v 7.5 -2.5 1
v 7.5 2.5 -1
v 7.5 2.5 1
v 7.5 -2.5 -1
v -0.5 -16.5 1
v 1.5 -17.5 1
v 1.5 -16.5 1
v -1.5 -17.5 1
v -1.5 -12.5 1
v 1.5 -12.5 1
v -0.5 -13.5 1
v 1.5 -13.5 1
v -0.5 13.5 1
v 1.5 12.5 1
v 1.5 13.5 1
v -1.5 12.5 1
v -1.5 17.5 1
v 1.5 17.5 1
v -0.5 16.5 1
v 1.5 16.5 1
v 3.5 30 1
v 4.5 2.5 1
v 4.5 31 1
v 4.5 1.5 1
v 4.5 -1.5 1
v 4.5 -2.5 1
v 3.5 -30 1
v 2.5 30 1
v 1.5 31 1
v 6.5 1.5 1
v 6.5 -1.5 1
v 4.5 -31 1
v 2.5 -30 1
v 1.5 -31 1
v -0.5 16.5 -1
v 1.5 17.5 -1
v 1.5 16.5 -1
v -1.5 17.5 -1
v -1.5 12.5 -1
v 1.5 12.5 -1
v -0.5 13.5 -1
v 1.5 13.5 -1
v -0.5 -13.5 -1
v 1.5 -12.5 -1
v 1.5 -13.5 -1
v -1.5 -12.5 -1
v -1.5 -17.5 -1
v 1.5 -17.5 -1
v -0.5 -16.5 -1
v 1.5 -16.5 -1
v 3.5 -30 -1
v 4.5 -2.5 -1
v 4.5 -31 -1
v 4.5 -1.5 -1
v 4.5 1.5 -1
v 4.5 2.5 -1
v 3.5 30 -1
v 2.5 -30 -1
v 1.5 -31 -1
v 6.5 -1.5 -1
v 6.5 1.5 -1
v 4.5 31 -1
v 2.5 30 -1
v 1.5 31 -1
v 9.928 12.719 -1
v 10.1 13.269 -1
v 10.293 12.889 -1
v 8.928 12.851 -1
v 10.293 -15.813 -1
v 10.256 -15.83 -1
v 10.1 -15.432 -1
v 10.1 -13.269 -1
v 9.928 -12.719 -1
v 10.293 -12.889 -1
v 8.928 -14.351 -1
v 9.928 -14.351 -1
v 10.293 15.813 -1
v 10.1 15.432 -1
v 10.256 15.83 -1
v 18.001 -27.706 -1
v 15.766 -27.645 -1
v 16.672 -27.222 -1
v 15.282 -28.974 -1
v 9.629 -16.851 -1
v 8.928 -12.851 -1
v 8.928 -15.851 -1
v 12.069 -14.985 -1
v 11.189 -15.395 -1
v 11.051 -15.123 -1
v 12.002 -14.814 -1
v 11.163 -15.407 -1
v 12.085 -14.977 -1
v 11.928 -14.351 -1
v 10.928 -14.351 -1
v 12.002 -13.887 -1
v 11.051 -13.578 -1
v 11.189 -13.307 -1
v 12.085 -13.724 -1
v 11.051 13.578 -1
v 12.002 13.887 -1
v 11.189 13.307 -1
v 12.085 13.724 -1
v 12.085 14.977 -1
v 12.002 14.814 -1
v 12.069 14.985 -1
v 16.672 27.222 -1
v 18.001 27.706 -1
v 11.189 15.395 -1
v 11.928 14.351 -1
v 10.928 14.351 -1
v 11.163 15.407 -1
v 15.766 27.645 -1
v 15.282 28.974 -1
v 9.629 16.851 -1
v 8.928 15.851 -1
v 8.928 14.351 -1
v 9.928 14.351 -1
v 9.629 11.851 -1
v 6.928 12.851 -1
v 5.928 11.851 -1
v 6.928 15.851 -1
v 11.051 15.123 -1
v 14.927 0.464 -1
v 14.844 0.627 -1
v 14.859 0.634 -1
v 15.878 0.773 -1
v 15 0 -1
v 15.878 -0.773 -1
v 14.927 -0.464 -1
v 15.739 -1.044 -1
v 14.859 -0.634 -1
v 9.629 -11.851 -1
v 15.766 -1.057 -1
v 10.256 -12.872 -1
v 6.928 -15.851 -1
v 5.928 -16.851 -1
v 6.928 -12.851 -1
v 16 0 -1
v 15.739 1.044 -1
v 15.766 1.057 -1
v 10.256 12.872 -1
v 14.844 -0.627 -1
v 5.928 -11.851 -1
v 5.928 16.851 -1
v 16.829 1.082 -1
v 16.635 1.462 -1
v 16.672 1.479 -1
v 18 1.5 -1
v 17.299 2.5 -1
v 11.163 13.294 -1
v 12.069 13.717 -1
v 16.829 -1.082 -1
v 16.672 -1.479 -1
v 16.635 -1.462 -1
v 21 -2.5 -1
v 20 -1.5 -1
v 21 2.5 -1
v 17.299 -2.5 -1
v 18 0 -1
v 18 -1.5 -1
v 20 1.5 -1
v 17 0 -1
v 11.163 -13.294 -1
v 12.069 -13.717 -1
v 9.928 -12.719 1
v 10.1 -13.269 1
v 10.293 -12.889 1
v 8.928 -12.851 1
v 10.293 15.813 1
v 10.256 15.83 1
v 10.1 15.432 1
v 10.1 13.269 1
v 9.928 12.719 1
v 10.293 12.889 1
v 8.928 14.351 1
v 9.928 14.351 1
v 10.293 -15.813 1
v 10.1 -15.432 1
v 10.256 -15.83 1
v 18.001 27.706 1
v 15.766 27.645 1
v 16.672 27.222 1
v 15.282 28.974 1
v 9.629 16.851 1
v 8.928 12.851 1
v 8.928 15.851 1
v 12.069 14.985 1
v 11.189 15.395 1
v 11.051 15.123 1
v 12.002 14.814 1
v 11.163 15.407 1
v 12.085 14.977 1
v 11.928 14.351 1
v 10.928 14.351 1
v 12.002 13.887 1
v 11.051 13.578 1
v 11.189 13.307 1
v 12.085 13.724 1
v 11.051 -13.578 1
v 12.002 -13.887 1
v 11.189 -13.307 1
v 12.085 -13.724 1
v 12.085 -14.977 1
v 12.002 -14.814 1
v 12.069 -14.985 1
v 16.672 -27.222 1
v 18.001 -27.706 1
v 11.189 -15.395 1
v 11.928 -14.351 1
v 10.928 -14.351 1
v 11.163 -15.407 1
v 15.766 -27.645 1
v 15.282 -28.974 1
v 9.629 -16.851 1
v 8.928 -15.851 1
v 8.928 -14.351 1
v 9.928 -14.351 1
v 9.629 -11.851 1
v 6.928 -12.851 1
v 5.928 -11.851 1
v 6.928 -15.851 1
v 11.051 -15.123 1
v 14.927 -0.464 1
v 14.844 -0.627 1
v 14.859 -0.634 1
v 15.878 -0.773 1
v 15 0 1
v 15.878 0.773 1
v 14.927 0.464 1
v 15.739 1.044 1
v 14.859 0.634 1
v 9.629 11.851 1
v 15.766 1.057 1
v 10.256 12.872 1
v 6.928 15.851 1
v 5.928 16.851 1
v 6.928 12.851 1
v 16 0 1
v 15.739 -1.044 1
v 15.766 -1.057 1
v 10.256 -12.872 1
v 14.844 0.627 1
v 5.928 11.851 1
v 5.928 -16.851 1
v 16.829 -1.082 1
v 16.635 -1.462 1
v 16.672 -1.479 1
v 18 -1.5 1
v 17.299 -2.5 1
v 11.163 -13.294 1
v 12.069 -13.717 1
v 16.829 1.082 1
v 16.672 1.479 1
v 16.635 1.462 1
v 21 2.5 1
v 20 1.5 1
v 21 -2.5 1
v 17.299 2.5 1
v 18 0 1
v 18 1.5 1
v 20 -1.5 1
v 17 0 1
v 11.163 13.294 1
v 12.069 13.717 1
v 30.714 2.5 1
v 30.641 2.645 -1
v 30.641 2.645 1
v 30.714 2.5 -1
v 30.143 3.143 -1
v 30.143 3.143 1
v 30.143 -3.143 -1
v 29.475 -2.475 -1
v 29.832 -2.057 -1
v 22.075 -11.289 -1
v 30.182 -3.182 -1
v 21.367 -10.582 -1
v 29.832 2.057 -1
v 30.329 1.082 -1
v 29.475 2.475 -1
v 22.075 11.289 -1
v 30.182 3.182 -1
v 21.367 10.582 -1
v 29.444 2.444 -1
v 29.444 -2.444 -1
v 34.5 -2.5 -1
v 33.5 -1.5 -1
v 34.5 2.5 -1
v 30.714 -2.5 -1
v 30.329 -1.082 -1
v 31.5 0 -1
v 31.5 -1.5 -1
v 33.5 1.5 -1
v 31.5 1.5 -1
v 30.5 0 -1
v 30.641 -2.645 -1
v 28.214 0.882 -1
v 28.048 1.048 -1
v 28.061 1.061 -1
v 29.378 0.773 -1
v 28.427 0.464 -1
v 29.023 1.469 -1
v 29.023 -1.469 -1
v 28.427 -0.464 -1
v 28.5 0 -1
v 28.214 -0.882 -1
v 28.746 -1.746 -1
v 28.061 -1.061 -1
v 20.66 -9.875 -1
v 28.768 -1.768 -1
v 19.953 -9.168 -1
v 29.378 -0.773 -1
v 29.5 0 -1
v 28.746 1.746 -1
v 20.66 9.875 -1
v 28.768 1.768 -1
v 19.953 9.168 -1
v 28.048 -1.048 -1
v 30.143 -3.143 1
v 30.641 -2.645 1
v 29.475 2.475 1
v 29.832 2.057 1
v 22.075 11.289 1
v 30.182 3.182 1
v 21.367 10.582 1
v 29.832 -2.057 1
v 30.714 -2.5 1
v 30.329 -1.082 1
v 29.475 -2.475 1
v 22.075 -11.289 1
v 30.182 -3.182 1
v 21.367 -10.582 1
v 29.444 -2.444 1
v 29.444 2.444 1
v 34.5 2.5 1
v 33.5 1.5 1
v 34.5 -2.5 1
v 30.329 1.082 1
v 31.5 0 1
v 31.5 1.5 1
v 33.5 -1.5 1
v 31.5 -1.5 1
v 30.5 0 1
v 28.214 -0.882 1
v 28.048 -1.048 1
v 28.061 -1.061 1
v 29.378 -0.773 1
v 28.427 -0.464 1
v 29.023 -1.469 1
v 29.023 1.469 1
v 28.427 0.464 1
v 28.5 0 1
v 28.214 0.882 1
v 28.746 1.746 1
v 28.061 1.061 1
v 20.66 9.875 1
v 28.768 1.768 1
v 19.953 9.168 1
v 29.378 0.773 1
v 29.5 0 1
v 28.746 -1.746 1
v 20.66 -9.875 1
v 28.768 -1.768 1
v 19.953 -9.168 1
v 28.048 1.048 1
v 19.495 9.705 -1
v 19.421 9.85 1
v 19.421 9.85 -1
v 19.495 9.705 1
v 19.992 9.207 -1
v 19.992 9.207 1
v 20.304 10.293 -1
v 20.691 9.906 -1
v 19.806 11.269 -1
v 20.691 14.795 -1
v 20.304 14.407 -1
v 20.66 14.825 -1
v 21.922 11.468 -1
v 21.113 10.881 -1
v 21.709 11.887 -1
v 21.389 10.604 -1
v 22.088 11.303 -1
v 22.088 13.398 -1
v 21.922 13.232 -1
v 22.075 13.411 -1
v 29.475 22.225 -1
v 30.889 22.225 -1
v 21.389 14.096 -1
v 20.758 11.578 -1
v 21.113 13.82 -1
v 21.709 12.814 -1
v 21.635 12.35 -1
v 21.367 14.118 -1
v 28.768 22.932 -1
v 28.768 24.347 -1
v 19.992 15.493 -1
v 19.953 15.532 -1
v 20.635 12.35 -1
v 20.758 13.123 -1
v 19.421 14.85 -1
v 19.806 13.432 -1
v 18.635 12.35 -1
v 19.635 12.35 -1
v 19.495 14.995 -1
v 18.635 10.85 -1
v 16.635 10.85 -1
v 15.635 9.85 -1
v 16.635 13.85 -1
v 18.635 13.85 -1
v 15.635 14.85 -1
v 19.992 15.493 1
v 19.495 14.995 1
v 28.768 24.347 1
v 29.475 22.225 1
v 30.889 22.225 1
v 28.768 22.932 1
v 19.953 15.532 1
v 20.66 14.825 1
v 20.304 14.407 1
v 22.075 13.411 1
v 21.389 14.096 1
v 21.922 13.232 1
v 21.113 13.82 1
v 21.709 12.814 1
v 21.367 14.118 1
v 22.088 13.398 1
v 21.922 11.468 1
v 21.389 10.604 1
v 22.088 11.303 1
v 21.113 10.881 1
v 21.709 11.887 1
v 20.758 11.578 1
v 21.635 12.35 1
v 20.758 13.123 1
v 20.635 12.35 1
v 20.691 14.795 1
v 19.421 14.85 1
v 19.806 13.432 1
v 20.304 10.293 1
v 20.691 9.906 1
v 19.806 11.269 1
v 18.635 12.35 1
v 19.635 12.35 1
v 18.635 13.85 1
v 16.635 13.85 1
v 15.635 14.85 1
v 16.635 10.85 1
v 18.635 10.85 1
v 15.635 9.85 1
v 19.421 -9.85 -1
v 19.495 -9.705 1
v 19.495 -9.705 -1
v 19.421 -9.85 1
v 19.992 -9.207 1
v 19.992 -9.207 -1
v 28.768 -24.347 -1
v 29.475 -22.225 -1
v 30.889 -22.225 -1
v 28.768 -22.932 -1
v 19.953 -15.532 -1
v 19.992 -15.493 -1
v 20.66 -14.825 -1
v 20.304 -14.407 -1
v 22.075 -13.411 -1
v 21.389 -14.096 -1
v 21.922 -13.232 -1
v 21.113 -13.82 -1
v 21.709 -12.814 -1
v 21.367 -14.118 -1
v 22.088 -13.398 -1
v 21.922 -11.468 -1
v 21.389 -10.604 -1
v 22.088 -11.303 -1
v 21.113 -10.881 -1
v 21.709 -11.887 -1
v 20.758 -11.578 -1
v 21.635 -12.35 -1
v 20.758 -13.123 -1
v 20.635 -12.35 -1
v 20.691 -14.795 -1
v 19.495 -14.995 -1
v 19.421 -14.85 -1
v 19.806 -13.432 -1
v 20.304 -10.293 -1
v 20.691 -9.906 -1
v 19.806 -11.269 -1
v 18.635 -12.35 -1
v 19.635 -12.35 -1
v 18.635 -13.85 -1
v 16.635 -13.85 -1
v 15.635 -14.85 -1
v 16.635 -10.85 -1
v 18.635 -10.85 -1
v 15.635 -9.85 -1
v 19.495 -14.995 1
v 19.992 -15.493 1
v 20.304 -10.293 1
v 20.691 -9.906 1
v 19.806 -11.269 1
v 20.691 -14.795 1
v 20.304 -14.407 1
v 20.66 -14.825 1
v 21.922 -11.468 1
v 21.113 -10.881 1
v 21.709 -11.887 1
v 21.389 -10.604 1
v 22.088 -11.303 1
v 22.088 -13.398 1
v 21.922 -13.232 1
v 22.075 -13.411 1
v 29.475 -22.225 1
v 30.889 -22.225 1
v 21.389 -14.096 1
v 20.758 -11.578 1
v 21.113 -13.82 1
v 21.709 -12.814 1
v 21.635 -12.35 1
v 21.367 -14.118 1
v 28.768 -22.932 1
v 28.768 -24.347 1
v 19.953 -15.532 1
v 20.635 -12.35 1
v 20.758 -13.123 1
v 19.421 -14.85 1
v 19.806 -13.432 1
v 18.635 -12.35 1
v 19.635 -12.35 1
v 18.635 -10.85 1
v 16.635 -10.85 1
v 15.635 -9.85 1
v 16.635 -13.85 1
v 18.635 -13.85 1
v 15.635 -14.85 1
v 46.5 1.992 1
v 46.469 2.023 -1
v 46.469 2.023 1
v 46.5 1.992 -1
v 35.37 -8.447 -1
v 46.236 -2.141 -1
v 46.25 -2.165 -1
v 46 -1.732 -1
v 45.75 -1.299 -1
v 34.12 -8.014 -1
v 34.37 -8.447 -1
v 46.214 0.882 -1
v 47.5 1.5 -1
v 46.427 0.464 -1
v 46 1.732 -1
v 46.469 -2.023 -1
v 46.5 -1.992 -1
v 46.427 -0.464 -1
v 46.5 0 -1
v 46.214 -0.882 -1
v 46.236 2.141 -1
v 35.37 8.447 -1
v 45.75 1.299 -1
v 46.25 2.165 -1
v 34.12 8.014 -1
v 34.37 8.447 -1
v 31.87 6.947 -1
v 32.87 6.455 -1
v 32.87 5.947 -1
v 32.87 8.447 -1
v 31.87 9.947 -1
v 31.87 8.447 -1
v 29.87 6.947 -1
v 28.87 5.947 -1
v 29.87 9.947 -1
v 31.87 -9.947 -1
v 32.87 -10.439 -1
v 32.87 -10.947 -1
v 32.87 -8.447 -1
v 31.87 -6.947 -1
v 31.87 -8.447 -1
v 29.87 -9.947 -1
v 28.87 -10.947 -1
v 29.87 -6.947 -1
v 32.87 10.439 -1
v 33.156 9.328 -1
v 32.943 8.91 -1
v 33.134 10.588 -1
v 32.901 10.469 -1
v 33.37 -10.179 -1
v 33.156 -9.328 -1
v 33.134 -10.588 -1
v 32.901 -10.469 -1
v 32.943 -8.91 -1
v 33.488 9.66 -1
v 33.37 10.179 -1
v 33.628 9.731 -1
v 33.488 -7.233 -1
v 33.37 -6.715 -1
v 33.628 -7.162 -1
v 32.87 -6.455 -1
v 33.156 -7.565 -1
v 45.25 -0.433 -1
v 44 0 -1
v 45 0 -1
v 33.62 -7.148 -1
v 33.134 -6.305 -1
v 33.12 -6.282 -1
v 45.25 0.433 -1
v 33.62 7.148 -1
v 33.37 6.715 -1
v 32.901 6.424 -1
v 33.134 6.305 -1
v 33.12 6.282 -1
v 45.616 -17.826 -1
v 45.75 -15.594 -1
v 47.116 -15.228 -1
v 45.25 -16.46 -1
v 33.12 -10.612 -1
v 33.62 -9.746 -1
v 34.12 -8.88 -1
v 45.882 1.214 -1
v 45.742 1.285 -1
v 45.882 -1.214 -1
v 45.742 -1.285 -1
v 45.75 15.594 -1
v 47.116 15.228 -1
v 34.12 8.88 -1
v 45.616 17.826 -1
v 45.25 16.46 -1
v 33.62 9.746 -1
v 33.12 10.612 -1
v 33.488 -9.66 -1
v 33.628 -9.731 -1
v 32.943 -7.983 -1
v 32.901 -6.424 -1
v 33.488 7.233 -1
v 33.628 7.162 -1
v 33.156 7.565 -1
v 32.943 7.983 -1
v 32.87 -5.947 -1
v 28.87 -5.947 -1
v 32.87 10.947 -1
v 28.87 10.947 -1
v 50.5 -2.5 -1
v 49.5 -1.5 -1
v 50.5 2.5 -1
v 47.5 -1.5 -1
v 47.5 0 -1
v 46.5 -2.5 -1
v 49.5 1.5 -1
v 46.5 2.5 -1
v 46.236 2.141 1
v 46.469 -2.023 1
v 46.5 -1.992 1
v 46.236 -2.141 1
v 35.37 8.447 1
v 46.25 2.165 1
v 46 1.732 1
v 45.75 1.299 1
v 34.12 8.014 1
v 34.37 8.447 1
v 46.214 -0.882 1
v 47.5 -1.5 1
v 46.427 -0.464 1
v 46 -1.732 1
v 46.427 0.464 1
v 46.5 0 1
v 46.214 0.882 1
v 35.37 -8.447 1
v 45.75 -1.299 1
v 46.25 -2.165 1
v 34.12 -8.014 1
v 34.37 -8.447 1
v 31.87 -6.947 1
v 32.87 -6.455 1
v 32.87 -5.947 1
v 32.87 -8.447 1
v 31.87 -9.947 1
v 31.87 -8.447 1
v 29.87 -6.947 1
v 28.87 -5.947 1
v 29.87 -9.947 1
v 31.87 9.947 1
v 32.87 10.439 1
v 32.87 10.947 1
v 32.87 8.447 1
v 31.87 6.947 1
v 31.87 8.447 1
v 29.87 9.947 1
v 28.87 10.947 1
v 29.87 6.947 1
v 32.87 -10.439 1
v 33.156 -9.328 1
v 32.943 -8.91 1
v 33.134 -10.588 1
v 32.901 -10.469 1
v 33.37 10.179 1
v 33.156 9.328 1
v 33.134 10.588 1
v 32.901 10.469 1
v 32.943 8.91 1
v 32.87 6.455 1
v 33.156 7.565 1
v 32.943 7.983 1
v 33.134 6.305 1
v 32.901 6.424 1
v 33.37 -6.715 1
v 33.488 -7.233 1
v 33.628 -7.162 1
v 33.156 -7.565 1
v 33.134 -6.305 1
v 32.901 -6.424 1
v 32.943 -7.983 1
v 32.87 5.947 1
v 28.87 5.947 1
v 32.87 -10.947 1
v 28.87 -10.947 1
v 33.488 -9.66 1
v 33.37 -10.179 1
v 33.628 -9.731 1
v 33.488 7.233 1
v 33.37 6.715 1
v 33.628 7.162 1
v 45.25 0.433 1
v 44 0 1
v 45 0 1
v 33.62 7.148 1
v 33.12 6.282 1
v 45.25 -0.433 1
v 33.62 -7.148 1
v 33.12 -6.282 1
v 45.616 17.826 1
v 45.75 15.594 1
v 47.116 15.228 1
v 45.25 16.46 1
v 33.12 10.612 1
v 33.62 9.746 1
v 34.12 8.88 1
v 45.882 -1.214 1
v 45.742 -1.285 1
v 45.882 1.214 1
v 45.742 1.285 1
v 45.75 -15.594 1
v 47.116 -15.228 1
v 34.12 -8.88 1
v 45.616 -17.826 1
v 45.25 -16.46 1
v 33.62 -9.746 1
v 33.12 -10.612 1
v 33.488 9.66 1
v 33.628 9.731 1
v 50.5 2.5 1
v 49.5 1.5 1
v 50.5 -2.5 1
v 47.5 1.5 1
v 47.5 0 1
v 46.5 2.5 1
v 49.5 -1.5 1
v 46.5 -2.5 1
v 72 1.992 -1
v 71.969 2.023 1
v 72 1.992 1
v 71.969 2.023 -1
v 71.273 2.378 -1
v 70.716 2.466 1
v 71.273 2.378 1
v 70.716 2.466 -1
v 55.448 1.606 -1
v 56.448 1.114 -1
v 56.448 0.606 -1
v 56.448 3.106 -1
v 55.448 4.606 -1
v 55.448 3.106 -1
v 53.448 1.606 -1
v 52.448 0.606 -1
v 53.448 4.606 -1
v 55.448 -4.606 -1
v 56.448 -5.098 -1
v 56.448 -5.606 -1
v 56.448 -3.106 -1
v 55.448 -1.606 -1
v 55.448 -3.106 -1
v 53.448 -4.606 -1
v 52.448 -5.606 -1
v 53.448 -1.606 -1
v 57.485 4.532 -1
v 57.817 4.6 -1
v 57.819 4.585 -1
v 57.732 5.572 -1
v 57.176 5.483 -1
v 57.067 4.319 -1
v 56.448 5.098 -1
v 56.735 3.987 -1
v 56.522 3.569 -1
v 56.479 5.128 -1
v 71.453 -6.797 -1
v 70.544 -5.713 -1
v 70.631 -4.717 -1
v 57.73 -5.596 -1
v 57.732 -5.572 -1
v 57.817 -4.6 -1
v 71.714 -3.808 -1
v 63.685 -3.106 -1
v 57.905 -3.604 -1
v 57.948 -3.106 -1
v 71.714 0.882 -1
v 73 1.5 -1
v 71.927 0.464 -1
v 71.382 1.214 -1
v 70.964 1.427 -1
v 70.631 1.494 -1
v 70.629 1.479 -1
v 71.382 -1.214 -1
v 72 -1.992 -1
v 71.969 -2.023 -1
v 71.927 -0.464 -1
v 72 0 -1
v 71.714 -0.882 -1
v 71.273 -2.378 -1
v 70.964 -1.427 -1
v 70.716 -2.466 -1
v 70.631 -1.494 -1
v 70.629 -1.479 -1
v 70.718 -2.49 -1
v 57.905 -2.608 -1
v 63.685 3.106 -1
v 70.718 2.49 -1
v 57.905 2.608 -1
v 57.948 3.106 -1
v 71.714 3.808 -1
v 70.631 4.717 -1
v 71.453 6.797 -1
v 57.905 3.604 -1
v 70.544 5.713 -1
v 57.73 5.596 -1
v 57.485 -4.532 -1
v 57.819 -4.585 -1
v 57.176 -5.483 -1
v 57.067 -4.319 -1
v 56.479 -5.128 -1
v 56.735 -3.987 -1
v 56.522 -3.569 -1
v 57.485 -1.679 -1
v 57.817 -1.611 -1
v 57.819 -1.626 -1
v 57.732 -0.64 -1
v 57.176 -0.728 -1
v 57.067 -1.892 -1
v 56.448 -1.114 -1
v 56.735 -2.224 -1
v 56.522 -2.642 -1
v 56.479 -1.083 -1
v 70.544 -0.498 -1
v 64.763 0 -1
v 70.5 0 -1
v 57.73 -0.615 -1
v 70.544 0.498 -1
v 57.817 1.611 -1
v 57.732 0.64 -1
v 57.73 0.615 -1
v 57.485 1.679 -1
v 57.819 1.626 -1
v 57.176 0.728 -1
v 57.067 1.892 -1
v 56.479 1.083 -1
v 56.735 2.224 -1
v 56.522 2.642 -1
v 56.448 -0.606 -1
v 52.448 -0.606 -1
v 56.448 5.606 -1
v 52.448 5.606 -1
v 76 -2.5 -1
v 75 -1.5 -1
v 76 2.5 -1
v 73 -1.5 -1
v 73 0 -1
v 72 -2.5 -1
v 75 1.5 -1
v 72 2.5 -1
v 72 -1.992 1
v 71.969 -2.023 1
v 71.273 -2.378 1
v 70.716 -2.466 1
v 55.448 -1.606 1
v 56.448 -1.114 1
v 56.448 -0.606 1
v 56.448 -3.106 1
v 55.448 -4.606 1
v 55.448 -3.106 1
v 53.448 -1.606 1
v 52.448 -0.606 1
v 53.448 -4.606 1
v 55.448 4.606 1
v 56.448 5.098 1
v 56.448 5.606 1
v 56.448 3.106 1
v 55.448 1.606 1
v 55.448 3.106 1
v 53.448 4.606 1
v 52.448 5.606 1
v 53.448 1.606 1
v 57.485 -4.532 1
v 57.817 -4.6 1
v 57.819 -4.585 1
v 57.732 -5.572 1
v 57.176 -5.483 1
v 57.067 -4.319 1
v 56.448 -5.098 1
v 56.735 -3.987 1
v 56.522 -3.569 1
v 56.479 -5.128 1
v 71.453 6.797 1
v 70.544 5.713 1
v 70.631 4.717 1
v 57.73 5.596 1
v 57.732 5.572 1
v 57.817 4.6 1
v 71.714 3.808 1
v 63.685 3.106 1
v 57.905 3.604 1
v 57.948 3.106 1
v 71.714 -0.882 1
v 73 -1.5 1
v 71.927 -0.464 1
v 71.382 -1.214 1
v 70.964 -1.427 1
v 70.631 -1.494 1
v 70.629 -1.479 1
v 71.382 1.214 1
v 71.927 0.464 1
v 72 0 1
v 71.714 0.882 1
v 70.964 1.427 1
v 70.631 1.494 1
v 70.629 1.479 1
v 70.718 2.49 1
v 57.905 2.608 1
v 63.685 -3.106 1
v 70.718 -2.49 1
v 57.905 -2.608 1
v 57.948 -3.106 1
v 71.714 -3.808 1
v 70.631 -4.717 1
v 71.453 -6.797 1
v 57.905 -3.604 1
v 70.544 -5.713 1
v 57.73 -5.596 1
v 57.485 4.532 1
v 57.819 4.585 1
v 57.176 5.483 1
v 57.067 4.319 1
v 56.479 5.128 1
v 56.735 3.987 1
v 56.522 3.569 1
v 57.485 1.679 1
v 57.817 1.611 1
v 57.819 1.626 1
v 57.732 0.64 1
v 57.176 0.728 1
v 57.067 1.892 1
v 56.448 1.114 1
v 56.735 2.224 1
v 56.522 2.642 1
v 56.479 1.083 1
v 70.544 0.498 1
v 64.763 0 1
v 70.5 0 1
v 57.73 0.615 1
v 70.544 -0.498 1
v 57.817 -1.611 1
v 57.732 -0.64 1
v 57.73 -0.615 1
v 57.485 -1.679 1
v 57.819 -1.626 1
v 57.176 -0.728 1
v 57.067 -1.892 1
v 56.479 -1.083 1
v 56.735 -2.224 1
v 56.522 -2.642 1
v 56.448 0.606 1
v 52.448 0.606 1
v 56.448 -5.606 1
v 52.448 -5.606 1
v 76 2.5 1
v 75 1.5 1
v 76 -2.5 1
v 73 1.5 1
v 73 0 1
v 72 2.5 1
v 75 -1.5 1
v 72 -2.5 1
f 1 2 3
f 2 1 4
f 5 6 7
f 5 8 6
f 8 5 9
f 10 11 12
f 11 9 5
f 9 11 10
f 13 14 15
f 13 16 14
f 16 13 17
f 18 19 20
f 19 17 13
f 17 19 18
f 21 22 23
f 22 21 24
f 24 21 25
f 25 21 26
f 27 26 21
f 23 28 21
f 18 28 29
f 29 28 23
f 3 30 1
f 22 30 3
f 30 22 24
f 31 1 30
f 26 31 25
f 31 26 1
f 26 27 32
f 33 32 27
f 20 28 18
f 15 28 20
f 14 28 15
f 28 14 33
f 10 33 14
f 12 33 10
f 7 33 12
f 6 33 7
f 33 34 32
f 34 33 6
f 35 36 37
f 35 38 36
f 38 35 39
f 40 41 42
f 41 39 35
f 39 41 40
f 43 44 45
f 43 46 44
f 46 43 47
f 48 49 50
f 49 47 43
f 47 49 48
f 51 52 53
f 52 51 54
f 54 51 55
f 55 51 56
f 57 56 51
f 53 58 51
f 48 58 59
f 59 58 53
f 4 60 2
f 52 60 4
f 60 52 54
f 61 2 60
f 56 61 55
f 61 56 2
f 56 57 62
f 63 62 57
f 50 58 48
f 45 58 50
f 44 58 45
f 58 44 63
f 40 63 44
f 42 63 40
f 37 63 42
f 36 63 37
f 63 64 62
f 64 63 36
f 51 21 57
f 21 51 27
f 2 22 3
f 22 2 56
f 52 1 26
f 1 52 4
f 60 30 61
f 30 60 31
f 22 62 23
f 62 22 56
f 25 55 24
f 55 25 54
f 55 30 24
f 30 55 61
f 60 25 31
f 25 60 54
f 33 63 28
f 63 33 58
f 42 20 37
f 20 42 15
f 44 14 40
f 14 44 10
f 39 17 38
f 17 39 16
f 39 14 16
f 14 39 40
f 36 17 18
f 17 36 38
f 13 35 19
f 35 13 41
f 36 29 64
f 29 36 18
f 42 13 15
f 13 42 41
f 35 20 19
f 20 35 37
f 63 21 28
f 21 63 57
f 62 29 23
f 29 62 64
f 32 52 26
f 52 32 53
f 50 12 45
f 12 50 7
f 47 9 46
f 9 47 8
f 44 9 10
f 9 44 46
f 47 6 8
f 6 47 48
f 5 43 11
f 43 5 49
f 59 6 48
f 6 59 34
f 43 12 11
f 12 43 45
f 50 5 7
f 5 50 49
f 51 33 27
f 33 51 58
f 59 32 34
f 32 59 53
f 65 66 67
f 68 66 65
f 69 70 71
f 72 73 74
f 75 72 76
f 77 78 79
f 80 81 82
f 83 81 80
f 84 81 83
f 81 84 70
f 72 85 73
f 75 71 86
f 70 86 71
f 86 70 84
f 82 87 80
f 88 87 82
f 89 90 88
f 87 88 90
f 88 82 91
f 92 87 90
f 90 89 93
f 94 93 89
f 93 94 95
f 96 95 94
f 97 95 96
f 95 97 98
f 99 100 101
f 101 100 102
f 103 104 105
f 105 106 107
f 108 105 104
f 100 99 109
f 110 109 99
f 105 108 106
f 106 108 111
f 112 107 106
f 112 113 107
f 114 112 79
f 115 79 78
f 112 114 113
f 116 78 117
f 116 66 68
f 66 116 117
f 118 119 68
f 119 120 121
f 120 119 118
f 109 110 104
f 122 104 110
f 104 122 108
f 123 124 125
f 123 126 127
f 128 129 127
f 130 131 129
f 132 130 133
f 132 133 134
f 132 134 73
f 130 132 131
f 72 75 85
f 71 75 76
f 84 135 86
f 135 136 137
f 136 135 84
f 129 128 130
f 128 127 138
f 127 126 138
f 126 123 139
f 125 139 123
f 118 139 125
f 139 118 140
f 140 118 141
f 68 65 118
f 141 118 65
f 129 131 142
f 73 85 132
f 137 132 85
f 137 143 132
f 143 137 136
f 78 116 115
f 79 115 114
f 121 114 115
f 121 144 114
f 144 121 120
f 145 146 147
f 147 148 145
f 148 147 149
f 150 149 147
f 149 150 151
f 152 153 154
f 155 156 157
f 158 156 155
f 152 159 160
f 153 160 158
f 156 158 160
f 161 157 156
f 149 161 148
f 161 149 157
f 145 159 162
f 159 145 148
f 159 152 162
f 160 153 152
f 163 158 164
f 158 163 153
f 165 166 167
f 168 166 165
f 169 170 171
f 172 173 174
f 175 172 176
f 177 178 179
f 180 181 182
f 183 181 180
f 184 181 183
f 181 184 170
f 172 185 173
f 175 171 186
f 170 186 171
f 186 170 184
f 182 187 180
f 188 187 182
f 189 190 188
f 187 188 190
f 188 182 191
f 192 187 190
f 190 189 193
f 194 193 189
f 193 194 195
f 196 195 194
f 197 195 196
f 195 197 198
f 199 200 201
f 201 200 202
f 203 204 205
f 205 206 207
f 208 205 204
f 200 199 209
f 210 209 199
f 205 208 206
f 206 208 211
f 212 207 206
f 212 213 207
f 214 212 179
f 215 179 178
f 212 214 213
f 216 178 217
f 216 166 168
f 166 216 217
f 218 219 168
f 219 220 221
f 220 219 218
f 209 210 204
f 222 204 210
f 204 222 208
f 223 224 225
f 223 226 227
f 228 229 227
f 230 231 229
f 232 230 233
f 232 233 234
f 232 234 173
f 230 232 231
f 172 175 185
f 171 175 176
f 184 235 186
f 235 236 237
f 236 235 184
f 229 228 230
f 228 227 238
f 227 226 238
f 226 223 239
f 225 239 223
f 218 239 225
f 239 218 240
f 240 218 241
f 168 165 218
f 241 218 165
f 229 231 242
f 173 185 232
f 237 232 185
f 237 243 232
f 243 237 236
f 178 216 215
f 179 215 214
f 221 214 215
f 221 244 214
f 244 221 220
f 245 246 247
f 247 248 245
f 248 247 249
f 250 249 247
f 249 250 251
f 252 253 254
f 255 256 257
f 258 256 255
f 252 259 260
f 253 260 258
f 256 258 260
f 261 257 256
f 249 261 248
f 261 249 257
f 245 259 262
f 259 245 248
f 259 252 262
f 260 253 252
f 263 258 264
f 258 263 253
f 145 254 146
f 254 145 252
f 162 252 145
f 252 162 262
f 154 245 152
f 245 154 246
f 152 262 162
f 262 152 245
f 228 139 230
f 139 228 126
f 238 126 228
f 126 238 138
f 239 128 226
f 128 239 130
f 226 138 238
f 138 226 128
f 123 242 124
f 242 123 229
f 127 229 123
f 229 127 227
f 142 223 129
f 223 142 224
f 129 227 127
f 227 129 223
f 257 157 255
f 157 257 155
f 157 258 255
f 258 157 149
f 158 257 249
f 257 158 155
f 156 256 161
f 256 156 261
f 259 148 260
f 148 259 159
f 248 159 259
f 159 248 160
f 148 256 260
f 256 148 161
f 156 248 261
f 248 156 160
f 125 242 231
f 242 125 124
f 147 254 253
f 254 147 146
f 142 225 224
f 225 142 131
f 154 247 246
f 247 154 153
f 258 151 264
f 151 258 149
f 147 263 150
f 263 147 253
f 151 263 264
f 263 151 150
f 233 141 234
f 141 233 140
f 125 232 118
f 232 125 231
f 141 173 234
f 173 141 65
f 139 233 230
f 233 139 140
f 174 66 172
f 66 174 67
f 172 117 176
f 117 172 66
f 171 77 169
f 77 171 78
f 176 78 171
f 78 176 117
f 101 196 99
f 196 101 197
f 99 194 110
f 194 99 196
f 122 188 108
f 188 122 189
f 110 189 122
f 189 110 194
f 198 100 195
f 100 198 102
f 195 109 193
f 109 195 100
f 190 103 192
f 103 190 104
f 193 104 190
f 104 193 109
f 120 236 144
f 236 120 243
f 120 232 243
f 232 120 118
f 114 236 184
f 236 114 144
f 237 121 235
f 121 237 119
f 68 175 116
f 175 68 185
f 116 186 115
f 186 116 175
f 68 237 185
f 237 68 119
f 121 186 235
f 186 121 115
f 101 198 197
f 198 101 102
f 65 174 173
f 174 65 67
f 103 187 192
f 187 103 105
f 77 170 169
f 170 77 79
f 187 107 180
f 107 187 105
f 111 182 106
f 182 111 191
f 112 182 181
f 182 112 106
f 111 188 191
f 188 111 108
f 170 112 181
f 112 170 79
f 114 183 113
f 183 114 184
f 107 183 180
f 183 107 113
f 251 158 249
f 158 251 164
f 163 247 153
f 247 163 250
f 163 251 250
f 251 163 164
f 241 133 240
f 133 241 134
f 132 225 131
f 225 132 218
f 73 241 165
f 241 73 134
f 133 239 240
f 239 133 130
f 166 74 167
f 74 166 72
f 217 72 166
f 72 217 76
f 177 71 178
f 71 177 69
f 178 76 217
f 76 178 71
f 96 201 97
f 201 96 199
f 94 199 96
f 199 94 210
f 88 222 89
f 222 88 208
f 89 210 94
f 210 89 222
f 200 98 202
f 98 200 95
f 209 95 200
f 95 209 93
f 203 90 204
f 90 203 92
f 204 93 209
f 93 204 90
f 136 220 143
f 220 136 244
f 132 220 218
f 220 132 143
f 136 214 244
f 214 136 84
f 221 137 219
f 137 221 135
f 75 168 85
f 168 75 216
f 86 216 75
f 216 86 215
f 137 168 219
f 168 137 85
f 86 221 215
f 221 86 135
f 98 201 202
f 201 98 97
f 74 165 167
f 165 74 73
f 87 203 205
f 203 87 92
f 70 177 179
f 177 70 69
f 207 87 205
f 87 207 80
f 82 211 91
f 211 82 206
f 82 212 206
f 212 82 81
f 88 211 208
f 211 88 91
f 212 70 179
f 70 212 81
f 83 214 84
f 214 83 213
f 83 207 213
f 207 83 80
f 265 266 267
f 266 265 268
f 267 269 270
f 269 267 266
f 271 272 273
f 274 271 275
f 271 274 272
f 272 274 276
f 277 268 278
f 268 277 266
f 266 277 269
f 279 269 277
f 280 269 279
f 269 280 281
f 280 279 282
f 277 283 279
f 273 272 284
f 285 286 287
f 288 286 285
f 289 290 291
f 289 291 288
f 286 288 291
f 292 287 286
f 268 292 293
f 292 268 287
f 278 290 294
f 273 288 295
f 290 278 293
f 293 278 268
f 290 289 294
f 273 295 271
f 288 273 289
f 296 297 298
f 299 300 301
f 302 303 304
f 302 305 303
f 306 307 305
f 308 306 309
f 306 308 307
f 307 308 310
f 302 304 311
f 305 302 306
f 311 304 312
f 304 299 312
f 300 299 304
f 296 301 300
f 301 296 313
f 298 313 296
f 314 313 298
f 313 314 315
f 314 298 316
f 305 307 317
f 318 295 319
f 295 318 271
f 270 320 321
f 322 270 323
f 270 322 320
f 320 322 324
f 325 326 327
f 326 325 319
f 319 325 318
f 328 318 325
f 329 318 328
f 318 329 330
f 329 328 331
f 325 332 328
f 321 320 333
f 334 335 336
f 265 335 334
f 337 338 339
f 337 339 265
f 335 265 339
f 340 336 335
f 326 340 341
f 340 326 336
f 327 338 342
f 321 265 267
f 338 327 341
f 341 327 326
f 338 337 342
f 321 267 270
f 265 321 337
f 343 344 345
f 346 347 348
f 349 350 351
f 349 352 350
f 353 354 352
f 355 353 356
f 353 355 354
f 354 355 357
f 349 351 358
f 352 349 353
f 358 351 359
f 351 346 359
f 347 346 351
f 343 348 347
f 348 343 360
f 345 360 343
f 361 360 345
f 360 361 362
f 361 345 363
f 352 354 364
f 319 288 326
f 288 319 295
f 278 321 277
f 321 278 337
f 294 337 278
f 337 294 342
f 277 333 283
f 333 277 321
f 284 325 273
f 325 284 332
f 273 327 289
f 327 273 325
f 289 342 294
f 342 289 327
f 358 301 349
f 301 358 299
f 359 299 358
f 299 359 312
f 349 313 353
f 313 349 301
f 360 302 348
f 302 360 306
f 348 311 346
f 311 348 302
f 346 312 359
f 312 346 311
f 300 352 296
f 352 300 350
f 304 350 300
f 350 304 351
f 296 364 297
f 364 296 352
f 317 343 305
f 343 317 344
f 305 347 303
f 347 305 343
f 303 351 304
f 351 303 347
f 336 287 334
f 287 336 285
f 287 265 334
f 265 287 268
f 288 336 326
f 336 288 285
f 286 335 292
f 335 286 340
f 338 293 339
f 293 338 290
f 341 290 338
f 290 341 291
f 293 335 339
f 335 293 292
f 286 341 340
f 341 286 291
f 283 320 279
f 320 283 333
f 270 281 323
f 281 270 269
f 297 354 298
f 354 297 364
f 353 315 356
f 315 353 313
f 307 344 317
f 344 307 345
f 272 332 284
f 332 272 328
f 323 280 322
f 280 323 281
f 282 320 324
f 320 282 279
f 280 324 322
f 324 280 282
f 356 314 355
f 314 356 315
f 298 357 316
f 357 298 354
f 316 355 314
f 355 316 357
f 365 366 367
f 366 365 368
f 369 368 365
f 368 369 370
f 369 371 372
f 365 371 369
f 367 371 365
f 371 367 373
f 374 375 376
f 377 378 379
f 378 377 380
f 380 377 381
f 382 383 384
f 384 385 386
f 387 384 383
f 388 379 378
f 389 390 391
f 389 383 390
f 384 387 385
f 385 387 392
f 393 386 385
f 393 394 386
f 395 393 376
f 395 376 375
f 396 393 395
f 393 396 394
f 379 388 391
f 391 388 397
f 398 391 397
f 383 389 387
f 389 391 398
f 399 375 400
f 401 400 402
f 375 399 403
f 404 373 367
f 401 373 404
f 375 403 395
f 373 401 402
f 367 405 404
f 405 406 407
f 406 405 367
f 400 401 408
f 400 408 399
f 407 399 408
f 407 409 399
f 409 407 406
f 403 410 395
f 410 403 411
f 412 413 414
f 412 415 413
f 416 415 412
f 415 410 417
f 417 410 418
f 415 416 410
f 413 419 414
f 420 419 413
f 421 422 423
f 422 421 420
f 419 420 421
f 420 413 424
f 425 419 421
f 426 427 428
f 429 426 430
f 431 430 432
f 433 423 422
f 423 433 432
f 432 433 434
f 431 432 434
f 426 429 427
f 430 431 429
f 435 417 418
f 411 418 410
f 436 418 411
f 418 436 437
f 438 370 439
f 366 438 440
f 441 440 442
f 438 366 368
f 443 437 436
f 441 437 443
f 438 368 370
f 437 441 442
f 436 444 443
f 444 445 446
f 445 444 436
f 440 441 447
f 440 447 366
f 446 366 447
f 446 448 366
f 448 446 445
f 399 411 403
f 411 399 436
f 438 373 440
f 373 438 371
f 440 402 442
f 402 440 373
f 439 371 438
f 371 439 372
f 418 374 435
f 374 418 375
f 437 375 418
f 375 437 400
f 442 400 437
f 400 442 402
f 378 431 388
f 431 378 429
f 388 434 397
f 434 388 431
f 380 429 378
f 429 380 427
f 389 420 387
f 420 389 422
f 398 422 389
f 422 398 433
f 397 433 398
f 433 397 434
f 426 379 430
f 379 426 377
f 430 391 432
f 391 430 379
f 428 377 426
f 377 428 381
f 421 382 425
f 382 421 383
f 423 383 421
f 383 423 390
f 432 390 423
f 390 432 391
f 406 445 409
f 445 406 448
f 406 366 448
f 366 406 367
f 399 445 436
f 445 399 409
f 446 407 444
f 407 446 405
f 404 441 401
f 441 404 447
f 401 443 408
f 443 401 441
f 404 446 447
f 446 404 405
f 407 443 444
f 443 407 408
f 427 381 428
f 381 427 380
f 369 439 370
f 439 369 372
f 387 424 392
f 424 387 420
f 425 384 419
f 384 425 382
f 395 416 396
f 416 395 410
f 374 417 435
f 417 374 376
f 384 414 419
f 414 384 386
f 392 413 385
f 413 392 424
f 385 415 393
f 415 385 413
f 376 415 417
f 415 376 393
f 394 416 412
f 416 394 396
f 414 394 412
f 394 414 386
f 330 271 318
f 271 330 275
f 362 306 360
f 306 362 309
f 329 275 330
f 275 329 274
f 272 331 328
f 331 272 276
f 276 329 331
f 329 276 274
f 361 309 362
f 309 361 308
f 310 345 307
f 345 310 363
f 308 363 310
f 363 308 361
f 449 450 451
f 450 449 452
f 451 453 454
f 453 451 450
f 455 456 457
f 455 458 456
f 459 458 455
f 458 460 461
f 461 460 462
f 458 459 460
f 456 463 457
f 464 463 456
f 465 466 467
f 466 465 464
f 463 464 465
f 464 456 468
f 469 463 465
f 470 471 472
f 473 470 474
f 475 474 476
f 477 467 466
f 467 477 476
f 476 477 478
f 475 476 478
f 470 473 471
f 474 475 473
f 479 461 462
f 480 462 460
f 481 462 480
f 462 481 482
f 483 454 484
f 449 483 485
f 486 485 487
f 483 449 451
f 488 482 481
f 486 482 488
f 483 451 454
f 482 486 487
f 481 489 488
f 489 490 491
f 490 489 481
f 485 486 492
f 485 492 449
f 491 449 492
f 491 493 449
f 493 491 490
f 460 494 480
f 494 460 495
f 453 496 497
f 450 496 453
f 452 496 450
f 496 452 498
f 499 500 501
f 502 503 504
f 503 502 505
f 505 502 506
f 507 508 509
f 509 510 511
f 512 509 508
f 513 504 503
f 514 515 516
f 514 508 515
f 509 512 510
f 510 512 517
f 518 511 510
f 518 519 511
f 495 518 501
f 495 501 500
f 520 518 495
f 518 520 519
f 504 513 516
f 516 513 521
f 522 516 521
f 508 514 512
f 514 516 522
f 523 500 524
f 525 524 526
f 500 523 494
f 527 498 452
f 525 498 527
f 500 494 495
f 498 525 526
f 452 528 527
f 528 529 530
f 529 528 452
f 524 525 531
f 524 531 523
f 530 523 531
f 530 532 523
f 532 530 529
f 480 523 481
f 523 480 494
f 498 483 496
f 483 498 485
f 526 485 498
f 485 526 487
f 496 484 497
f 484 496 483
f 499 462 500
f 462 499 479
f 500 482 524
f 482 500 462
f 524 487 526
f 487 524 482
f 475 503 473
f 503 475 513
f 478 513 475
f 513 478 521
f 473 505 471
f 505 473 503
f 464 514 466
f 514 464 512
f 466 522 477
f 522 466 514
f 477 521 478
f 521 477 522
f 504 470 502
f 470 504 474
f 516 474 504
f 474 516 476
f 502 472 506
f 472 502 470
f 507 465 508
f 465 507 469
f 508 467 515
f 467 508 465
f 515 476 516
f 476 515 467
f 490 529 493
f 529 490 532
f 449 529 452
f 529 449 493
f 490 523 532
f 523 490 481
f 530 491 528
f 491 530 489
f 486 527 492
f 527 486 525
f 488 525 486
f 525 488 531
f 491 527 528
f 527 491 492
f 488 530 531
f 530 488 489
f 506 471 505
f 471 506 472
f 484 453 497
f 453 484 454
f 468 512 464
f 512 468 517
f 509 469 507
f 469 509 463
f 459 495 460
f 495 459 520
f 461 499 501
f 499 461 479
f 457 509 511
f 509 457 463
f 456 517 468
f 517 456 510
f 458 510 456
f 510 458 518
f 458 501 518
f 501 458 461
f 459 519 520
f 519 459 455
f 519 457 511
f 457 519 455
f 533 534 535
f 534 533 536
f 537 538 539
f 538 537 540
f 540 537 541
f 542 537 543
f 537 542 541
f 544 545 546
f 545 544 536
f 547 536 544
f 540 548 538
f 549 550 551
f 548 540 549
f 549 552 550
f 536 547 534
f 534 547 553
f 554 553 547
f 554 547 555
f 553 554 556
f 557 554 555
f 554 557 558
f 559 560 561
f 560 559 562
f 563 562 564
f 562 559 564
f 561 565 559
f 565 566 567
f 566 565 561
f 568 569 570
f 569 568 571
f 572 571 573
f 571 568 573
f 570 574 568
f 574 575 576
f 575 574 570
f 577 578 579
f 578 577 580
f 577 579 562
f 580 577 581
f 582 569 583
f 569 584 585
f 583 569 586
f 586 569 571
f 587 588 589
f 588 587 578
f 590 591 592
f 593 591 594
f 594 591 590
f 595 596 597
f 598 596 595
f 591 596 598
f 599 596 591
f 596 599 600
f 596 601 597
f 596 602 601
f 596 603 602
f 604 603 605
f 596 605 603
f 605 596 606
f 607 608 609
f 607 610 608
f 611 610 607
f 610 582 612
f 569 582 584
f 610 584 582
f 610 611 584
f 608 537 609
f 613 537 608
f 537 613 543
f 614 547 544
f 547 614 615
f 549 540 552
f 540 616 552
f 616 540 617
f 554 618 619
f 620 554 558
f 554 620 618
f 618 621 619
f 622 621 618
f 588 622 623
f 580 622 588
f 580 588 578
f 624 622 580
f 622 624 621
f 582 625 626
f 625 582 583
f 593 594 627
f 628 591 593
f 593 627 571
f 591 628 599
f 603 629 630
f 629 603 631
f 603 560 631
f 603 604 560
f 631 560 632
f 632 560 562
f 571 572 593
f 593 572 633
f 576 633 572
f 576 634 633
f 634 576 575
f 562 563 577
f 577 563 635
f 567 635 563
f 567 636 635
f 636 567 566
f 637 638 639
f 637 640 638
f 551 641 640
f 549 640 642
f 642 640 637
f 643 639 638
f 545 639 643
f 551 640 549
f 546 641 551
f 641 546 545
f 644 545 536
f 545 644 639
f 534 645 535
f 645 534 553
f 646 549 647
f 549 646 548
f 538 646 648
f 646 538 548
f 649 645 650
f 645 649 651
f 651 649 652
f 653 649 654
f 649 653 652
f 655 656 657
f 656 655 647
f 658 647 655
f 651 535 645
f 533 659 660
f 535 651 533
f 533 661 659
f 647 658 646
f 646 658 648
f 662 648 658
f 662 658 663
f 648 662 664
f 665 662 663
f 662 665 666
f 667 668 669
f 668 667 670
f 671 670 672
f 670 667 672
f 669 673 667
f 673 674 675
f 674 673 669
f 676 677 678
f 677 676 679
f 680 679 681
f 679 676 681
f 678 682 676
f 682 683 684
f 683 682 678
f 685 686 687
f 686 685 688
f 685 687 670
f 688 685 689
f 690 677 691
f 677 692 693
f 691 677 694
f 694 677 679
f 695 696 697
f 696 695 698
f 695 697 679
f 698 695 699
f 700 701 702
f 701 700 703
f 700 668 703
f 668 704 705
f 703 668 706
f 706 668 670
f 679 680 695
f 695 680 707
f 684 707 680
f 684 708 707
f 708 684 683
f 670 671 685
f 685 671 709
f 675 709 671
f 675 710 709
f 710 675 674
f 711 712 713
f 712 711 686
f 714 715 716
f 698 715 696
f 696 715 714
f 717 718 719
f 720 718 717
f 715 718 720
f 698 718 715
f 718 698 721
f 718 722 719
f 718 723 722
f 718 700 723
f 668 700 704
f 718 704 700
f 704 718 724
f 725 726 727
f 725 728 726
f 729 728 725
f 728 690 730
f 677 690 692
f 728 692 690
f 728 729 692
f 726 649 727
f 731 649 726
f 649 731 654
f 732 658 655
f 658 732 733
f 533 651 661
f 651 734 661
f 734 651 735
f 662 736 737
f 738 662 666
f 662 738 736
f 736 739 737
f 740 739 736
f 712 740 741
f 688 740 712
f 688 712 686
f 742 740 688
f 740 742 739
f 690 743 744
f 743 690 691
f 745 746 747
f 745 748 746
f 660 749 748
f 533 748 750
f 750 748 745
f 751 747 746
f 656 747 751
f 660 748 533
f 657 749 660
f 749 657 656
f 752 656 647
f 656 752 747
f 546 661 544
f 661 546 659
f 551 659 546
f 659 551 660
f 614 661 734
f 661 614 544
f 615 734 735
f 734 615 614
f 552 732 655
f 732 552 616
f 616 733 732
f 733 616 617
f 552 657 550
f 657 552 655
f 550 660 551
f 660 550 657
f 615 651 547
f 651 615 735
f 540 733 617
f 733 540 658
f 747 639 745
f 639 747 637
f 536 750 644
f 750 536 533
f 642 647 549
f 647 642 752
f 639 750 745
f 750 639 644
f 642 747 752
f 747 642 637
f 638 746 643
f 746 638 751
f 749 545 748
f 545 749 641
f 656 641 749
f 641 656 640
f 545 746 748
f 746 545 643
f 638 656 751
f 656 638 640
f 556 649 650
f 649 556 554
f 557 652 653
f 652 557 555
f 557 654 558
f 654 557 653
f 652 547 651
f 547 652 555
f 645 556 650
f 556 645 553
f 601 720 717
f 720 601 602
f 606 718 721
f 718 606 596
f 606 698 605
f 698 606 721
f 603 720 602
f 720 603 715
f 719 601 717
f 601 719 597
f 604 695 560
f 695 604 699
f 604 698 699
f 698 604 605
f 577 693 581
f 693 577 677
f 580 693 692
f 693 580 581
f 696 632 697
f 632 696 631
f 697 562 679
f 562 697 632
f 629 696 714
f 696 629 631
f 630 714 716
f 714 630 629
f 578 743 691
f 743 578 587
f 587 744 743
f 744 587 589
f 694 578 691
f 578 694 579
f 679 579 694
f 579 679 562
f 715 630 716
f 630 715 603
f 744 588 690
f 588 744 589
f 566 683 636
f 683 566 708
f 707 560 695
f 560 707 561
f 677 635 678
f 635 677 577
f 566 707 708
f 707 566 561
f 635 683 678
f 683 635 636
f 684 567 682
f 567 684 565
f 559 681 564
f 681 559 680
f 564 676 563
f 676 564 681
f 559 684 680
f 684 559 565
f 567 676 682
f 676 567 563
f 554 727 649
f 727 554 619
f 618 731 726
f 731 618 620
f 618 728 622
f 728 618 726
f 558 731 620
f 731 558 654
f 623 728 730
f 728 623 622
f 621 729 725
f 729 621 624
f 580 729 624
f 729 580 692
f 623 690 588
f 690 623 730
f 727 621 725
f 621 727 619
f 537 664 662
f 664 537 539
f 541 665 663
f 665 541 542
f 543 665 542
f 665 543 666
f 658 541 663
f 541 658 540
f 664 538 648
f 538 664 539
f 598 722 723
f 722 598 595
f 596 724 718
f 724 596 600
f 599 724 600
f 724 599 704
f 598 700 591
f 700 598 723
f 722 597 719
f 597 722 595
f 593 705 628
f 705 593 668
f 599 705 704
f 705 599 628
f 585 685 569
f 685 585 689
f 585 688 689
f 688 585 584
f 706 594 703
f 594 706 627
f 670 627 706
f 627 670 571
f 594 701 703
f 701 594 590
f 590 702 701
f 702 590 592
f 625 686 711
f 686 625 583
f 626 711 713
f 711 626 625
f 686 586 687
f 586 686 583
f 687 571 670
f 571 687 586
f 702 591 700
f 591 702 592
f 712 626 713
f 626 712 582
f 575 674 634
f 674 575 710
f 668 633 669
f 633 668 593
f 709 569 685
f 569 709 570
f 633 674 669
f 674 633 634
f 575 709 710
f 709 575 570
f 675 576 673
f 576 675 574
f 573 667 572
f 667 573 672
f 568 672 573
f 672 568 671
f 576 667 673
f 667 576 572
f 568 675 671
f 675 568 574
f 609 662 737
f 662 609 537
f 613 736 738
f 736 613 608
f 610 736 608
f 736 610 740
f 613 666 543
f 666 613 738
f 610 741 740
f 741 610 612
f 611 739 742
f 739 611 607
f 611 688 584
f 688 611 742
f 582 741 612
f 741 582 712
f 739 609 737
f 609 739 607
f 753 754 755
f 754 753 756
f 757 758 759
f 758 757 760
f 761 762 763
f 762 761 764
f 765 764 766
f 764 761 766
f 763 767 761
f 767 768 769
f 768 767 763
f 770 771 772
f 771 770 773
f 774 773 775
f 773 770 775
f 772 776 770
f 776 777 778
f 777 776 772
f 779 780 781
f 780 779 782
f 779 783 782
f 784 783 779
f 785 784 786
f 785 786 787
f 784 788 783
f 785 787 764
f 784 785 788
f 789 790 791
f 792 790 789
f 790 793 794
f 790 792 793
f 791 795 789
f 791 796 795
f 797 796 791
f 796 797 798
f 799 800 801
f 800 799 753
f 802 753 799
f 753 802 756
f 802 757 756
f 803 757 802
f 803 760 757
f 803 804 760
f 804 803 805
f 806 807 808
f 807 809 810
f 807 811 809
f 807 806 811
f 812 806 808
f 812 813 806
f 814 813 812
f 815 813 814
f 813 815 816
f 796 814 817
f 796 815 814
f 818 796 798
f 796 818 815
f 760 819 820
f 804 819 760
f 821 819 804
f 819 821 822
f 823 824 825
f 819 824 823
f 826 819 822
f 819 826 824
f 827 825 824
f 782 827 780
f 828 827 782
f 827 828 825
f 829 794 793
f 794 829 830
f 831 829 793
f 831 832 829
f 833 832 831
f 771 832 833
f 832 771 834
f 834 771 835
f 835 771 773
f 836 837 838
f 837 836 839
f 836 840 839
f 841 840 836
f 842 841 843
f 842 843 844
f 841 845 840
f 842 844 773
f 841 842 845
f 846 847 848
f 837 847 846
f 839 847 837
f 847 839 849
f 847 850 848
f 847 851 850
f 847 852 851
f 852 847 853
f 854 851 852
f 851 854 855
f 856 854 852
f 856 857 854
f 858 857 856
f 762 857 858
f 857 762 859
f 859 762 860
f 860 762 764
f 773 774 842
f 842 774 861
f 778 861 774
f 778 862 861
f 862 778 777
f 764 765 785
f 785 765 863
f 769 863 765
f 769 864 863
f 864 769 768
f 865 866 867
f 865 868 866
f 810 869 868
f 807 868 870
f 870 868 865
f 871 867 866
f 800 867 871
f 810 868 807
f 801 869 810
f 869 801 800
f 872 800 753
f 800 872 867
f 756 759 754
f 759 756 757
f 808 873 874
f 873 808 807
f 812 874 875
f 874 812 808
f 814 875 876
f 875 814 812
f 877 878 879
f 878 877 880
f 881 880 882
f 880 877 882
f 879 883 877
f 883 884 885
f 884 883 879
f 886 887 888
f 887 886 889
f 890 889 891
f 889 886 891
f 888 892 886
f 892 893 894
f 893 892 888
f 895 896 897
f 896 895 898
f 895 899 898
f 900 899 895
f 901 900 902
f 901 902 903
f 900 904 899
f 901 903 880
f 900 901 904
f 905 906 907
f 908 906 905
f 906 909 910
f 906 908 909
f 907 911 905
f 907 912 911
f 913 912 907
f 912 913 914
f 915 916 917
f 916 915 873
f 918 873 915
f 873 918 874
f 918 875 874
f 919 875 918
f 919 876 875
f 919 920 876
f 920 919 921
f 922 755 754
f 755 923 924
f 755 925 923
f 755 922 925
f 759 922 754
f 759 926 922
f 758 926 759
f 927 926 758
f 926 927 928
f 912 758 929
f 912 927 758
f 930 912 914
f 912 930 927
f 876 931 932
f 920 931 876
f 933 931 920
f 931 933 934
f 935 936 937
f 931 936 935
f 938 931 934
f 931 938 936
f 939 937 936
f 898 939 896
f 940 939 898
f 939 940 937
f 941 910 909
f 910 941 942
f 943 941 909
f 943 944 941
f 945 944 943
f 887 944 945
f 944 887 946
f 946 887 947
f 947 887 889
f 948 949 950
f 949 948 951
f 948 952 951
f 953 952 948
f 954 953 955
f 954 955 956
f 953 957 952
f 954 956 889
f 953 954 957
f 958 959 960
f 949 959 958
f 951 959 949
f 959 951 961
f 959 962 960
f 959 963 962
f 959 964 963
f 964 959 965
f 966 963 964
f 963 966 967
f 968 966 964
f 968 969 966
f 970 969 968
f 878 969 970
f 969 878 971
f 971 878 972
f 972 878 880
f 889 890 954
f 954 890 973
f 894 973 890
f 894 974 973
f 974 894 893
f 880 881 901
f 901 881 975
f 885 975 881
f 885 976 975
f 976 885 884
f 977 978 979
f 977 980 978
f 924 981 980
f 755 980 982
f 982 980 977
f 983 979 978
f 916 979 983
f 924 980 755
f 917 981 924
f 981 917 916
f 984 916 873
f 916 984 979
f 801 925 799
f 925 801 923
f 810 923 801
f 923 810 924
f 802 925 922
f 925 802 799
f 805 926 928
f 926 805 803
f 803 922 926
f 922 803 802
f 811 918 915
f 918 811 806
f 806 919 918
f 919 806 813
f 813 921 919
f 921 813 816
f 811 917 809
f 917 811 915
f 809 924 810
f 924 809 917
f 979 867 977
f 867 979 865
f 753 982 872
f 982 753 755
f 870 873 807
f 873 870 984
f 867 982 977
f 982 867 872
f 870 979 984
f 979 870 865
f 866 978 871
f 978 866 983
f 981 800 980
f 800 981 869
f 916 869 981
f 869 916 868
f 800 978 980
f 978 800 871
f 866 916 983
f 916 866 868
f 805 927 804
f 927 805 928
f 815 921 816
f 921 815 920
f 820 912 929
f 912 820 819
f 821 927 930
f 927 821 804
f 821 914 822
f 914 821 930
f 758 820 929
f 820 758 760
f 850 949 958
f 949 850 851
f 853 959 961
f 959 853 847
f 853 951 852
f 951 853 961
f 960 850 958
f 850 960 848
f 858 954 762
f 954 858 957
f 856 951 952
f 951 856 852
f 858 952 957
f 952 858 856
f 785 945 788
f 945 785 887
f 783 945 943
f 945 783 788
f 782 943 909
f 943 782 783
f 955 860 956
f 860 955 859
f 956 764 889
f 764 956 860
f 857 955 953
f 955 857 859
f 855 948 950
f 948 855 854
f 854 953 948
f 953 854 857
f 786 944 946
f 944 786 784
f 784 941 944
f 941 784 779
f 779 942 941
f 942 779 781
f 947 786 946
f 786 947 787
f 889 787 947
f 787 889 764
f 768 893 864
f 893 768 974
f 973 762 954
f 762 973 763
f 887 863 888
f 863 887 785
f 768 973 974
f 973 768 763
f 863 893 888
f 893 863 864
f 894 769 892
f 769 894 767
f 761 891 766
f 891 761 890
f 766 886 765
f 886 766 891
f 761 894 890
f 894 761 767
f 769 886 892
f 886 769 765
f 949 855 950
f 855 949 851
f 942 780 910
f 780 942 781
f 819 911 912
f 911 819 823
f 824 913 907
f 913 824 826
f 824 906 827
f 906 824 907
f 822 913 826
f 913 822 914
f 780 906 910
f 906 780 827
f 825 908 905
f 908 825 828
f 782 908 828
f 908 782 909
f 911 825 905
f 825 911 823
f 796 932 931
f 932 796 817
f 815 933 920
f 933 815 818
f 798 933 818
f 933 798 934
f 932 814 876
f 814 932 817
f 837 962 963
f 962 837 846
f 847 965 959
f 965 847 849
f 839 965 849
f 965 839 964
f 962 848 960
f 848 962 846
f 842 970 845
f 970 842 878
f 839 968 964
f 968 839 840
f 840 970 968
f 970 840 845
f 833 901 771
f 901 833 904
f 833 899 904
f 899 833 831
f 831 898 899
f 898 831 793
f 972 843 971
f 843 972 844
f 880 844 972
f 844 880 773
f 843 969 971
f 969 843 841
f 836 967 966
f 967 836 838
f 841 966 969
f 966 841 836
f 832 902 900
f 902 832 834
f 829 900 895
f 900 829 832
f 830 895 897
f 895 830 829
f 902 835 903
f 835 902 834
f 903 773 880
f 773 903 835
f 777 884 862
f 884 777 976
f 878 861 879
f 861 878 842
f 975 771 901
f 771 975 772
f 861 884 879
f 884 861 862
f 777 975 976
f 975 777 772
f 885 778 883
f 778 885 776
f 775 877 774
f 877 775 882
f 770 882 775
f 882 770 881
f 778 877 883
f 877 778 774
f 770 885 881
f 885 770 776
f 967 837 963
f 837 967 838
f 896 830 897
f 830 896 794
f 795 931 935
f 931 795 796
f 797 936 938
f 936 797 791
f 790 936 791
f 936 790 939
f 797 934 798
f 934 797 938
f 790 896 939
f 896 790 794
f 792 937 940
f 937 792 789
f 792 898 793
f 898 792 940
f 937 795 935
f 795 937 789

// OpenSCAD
use <MCAD/regular_shapes.scad>

width = 60;
t = 1;
tz = 2;
r = 3;
theta0 = 90;

$fn = 20;

module bend(theta=theta0, r=r){
    difference(){
        union(){
            cylinder_tube(tz, r + t/2 + t, t, center=true);
            cylinder_tube(tz, r - t/2, t, center=true);
        }
        rotate(theta/2 - 90)
        translate([-2*r, 0, 0])
        cube([4*r, 4*r, 2*t], center=true);
        rotate(90 - theta/2)
        translate([-2*r, 0, 0])
        cube([4*r, 4*r, 2*t], center=true);
    }
    translate([r+2.5, 0, 0])
    difference(){
        cube([4, 5, tz], center=true);
        cube([2, 3, tz], center=true);
    }
}

module sides(theta=theta0/2, withend=false, l=width/4, r=r){
    rotate(theta){
        translate([r + t, l/2, 0])
        cube([t, l, tz], center=true);

        translate([r - t, l/2, 0])
        cube([t, l, tz], center=true);
        
        if(withend){
            translate([r, l + t/2, 0])
            cube([3*t, t, tz], center=true);
        }
    }
}

module half_thing(ratio=1, theta=theta0, r=r){
    bend(r=r, theta=theta);
    length = width / 2 - 1.5 * r * theta * PI / 180;
    l1 = length * ratio / 2;
    l2 = length * (2 - ratio) / 2;
    
    sides(l=l1, r=r, theta=theta/2);
    
    translate([-l1 * sin(theta/2) + 2 * r * cos(theta/2), 2 * r * sin(theta/2) + l1 * cos(theta/2), 0]){
        rotate(180)
        bend(r=r, theta=theta);
        translate([-2 * r * cos(theta/2), 2 * r * sin(theta/2), 0])
        sides(theta=-theta/2, withend=true, l=l2, r=r);
    }
}

module whole_thing(theta=theta0, r=r){
    half_thing(theta=theta, r=r);
    mirror([0, 1, 0]){
        half_thing(theta=theta, r=r);
    }
}

slots = true;
if (slots){
whole_thing(theta=0);

translate([0.9*width/4, 0, 0])
whole_thing(theta=50);

translate([1.8*width/4, 0, 0])
whole_thing(theta=90);

translate([3*width/4, 0, 0])
whole_thing(theta=120, r=1);

translate([4.7*width/4, 0, 0])
whole_thing(theta=170, r=1);
}

//cube([2.2, 100, 1.6]);
